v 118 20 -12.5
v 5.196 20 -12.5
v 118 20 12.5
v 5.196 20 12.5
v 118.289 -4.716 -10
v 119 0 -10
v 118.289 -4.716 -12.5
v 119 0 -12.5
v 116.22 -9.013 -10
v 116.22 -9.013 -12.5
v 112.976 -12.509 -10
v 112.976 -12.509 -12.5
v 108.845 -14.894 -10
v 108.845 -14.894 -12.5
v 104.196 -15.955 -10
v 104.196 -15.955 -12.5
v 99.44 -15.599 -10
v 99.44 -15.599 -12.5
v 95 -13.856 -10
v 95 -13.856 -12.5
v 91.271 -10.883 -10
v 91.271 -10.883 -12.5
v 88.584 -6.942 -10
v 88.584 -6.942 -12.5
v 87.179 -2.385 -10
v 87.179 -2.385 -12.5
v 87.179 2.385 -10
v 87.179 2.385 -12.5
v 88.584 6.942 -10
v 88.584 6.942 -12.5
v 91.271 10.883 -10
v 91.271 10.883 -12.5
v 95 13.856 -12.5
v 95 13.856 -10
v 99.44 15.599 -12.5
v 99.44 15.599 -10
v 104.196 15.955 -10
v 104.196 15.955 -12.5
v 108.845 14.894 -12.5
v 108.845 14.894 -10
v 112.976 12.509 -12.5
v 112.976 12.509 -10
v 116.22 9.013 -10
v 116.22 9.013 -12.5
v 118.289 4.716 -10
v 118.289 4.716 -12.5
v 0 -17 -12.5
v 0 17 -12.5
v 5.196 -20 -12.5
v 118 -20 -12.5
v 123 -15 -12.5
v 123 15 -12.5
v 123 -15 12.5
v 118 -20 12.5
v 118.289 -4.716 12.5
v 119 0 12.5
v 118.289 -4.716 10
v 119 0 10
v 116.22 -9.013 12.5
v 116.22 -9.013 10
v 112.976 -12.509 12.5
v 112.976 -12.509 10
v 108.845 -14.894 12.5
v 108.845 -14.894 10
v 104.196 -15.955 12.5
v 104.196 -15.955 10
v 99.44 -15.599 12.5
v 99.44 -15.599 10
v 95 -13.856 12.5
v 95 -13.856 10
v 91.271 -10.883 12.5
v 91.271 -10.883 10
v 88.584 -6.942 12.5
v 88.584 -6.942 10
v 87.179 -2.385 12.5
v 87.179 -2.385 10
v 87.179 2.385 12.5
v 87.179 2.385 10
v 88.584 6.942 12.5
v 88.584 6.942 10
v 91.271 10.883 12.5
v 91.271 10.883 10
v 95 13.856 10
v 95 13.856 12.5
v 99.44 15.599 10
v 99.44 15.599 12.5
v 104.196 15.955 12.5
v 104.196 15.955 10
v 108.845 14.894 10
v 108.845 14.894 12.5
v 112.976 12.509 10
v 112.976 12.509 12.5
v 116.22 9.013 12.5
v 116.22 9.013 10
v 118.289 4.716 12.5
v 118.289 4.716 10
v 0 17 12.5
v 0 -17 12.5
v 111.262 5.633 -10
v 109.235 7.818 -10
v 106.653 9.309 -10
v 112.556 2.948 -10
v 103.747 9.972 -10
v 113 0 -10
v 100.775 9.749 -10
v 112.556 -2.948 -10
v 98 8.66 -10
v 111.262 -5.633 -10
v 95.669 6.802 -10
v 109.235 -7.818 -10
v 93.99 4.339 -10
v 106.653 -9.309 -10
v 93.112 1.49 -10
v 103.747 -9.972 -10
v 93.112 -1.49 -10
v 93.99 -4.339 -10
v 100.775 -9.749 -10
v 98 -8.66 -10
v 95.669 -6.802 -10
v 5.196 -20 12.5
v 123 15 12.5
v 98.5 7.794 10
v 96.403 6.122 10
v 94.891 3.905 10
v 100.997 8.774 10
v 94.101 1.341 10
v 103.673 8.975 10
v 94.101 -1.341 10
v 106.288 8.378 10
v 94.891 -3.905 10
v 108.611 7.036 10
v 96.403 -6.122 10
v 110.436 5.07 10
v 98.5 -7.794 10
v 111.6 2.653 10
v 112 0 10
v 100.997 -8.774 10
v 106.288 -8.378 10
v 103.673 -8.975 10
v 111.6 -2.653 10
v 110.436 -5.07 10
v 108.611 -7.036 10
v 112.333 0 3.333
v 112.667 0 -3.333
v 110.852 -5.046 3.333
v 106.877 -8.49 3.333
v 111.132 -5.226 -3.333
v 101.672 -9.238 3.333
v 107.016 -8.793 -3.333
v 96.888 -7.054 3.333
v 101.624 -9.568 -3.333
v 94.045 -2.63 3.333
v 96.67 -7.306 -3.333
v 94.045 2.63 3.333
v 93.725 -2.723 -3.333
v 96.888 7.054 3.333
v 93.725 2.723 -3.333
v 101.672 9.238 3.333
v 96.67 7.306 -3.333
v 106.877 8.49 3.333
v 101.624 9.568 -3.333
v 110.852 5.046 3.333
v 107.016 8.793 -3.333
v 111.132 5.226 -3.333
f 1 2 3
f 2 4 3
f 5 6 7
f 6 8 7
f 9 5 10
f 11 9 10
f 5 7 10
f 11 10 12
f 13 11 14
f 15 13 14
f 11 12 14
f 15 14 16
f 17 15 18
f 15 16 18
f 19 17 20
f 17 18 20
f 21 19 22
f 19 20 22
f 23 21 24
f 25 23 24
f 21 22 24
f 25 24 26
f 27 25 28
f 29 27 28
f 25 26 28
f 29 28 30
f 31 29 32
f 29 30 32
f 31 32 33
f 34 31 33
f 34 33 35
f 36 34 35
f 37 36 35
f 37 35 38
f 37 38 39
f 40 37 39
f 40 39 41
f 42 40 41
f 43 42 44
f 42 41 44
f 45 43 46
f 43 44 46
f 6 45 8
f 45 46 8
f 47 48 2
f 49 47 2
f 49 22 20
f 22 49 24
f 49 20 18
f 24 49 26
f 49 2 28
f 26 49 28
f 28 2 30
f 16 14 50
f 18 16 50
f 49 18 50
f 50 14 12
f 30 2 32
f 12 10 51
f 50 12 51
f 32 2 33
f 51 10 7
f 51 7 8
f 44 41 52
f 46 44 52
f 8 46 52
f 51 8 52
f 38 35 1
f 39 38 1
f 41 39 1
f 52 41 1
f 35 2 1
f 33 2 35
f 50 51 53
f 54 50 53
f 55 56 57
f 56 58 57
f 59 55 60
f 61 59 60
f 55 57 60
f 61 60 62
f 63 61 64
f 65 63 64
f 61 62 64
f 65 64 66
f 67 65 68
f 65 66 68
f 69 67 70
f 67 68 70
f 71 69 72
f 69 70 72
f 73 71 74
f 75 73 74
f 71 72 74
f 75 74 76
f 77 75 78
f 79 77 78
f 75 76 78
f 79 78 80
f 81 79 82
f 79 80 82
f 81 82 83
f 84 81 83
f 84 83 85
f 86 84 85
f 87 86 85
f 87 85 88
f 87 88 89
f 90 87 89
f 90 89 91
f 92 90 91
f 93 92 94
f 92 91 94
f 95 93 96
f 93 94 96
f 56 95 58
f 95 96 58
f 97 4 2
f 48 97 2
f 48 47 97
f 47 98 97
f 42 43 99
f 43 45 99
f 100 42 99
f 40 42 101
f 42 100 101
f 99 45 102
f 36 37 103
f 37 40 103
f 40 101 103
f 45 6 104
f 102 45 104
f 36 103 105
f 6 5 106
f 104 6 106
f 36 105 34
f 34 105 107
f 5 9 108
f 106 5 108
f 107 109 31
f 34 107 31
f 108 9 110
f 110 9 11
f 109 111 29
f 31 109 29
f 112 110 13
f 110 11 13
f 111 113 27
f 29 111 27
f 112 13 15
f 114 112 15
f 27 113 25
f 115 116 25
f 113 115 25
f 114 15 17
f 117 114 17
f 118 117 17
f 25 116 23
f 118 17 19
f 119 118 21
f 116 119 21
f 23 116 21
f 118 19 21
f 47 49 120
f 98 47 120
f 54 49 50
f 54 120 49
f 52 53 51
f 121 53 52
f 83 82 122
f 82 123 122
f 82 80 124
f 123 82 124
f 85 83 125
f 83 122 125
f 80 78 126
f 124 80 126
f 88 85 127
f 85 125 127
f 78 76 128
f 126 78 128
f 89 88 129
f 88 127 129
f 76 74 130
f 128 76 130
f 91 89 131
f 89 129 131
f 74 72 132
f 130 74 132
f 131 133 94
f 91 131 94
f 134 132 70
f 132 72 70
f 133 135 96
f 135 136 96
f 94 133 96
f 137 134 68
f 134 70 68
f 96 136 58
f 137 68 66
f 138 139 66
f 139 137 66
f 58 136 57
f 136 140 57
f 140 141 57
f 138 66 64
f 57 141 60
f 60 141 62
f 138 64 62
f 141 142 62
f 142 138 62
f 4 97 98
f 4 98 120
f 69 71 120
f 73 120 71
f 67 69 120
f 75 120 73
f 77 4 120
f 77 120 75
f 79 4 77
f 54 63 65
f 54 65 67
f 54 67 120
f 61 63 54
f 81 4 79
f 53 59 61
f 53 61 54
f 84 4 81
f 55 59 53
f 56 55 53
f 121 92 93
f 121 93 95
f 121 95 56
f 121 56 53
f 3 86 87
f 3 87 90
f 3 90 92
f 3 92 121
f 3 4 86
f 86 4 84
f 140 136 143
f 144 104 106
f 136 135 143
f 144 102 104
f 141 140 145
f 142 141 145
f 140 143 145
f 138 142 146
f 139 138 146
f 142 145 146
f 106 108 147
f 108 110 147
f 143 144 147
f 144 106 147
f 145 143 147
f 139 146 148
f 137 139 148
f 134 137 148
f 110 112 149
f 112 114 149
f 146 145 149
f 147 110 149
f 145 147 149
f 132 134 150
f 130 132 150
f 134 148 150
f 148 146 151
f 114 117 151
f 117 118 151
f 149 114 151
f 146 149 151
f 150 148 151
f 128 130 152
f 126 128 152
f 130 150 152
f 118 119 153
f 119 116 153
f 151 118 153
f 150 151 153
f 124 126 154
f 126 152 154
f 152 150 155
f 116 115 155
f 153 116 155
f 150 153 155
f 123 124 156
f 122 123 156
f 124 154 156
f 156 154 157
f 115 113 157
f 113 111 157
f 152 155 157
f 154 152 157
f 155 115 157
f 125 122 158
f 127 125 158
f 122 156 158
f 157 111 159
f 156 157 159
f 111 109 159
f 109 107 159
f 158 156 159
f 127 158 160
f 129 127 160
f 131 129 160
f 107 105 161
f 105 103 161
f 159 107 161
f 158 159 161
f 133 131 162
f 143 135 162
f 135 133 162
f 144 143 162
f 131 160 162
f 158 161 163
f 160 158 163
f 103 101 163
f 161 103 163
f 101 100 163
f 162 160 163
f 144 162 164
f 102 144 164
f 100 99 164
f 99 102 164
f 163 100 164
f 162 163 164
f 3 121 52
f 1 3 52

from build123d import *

# Parameters (mm, degrees)
SKIZZE1_W                       = 123
SKIZZE1_H                       = 40
AUFSATZ_LINEAR_AUSTRAGEN1_DEPTH = 12.5
FASE_3X60_SIZE                  = 3
FASE_3X60_SIZE2                 = 5.196152423
FASE_5X45_SIZE                  = 5


with BuildPart() as part:
    # Skizze1 → Aufsatz-Linear austragen1 (new body, symmetric)
    with BuildSketch(Plane.XY):
        with Locations((61.5, 0)):
            Rectangle(SKIZZE1_W, SKIZZE1_H)
    extrude(amount=AUFSATZ_LINEAR_AUSTRAGEN1_DEPTH, both=True)

    # Skizze2 → Bohrung_Kegel 1_10 (revolve, cut)
    with BuildSketch(Plane(origin=(0, 0, 0), x_dir=(1, 0, 0), z_dir=(0, 1, 0)), mode=Mode.PRIVATE) as bohrung_kegel_1_10_sk:
        Polygon((103, -12.5), (87, -12.5), (87, -10), (94, -10), (93, 10), (87, 10), (87, 12.5), (103, 12.5), align=None)
    revolve(bohrung_kegel_1_10_sk.sketch.rotate(Axis((103, 0, 15.136672695), (0, 0, -1)), 180), axis=Axis((103, 0, 15.136672695), (0, 0, -1)), mode=Mode.SUBTRACT)  # turned: the seam where the file's is

    # Fase 3x60
    fase_3x60_edges = [part.edges().sort_by_distance(p)[0] for p in [
        (0, 20, 0),
        (0, -20, 0),
    ]]
    fase_3x60_side = [part.faces().sort_by_distance(p)[0] for p in [
        (0, 0, 0),
    ]]
    chamfer(fase_3x60_edges, length=FASE_3X60_SIZE, length2=FASE_3X60_SIZE2, reference=fase_3x60_side[0])

    # Fase 5x45
    fase_5x45_edges = [part.edges().sort_by_distance(p)[0] for p in [
        (123, 20, 0),
        (123, -20, 0),
    ]]
    chamfer(fase_5x45_edges, length=FASE_5X45_SIZE)


solid = part.part
